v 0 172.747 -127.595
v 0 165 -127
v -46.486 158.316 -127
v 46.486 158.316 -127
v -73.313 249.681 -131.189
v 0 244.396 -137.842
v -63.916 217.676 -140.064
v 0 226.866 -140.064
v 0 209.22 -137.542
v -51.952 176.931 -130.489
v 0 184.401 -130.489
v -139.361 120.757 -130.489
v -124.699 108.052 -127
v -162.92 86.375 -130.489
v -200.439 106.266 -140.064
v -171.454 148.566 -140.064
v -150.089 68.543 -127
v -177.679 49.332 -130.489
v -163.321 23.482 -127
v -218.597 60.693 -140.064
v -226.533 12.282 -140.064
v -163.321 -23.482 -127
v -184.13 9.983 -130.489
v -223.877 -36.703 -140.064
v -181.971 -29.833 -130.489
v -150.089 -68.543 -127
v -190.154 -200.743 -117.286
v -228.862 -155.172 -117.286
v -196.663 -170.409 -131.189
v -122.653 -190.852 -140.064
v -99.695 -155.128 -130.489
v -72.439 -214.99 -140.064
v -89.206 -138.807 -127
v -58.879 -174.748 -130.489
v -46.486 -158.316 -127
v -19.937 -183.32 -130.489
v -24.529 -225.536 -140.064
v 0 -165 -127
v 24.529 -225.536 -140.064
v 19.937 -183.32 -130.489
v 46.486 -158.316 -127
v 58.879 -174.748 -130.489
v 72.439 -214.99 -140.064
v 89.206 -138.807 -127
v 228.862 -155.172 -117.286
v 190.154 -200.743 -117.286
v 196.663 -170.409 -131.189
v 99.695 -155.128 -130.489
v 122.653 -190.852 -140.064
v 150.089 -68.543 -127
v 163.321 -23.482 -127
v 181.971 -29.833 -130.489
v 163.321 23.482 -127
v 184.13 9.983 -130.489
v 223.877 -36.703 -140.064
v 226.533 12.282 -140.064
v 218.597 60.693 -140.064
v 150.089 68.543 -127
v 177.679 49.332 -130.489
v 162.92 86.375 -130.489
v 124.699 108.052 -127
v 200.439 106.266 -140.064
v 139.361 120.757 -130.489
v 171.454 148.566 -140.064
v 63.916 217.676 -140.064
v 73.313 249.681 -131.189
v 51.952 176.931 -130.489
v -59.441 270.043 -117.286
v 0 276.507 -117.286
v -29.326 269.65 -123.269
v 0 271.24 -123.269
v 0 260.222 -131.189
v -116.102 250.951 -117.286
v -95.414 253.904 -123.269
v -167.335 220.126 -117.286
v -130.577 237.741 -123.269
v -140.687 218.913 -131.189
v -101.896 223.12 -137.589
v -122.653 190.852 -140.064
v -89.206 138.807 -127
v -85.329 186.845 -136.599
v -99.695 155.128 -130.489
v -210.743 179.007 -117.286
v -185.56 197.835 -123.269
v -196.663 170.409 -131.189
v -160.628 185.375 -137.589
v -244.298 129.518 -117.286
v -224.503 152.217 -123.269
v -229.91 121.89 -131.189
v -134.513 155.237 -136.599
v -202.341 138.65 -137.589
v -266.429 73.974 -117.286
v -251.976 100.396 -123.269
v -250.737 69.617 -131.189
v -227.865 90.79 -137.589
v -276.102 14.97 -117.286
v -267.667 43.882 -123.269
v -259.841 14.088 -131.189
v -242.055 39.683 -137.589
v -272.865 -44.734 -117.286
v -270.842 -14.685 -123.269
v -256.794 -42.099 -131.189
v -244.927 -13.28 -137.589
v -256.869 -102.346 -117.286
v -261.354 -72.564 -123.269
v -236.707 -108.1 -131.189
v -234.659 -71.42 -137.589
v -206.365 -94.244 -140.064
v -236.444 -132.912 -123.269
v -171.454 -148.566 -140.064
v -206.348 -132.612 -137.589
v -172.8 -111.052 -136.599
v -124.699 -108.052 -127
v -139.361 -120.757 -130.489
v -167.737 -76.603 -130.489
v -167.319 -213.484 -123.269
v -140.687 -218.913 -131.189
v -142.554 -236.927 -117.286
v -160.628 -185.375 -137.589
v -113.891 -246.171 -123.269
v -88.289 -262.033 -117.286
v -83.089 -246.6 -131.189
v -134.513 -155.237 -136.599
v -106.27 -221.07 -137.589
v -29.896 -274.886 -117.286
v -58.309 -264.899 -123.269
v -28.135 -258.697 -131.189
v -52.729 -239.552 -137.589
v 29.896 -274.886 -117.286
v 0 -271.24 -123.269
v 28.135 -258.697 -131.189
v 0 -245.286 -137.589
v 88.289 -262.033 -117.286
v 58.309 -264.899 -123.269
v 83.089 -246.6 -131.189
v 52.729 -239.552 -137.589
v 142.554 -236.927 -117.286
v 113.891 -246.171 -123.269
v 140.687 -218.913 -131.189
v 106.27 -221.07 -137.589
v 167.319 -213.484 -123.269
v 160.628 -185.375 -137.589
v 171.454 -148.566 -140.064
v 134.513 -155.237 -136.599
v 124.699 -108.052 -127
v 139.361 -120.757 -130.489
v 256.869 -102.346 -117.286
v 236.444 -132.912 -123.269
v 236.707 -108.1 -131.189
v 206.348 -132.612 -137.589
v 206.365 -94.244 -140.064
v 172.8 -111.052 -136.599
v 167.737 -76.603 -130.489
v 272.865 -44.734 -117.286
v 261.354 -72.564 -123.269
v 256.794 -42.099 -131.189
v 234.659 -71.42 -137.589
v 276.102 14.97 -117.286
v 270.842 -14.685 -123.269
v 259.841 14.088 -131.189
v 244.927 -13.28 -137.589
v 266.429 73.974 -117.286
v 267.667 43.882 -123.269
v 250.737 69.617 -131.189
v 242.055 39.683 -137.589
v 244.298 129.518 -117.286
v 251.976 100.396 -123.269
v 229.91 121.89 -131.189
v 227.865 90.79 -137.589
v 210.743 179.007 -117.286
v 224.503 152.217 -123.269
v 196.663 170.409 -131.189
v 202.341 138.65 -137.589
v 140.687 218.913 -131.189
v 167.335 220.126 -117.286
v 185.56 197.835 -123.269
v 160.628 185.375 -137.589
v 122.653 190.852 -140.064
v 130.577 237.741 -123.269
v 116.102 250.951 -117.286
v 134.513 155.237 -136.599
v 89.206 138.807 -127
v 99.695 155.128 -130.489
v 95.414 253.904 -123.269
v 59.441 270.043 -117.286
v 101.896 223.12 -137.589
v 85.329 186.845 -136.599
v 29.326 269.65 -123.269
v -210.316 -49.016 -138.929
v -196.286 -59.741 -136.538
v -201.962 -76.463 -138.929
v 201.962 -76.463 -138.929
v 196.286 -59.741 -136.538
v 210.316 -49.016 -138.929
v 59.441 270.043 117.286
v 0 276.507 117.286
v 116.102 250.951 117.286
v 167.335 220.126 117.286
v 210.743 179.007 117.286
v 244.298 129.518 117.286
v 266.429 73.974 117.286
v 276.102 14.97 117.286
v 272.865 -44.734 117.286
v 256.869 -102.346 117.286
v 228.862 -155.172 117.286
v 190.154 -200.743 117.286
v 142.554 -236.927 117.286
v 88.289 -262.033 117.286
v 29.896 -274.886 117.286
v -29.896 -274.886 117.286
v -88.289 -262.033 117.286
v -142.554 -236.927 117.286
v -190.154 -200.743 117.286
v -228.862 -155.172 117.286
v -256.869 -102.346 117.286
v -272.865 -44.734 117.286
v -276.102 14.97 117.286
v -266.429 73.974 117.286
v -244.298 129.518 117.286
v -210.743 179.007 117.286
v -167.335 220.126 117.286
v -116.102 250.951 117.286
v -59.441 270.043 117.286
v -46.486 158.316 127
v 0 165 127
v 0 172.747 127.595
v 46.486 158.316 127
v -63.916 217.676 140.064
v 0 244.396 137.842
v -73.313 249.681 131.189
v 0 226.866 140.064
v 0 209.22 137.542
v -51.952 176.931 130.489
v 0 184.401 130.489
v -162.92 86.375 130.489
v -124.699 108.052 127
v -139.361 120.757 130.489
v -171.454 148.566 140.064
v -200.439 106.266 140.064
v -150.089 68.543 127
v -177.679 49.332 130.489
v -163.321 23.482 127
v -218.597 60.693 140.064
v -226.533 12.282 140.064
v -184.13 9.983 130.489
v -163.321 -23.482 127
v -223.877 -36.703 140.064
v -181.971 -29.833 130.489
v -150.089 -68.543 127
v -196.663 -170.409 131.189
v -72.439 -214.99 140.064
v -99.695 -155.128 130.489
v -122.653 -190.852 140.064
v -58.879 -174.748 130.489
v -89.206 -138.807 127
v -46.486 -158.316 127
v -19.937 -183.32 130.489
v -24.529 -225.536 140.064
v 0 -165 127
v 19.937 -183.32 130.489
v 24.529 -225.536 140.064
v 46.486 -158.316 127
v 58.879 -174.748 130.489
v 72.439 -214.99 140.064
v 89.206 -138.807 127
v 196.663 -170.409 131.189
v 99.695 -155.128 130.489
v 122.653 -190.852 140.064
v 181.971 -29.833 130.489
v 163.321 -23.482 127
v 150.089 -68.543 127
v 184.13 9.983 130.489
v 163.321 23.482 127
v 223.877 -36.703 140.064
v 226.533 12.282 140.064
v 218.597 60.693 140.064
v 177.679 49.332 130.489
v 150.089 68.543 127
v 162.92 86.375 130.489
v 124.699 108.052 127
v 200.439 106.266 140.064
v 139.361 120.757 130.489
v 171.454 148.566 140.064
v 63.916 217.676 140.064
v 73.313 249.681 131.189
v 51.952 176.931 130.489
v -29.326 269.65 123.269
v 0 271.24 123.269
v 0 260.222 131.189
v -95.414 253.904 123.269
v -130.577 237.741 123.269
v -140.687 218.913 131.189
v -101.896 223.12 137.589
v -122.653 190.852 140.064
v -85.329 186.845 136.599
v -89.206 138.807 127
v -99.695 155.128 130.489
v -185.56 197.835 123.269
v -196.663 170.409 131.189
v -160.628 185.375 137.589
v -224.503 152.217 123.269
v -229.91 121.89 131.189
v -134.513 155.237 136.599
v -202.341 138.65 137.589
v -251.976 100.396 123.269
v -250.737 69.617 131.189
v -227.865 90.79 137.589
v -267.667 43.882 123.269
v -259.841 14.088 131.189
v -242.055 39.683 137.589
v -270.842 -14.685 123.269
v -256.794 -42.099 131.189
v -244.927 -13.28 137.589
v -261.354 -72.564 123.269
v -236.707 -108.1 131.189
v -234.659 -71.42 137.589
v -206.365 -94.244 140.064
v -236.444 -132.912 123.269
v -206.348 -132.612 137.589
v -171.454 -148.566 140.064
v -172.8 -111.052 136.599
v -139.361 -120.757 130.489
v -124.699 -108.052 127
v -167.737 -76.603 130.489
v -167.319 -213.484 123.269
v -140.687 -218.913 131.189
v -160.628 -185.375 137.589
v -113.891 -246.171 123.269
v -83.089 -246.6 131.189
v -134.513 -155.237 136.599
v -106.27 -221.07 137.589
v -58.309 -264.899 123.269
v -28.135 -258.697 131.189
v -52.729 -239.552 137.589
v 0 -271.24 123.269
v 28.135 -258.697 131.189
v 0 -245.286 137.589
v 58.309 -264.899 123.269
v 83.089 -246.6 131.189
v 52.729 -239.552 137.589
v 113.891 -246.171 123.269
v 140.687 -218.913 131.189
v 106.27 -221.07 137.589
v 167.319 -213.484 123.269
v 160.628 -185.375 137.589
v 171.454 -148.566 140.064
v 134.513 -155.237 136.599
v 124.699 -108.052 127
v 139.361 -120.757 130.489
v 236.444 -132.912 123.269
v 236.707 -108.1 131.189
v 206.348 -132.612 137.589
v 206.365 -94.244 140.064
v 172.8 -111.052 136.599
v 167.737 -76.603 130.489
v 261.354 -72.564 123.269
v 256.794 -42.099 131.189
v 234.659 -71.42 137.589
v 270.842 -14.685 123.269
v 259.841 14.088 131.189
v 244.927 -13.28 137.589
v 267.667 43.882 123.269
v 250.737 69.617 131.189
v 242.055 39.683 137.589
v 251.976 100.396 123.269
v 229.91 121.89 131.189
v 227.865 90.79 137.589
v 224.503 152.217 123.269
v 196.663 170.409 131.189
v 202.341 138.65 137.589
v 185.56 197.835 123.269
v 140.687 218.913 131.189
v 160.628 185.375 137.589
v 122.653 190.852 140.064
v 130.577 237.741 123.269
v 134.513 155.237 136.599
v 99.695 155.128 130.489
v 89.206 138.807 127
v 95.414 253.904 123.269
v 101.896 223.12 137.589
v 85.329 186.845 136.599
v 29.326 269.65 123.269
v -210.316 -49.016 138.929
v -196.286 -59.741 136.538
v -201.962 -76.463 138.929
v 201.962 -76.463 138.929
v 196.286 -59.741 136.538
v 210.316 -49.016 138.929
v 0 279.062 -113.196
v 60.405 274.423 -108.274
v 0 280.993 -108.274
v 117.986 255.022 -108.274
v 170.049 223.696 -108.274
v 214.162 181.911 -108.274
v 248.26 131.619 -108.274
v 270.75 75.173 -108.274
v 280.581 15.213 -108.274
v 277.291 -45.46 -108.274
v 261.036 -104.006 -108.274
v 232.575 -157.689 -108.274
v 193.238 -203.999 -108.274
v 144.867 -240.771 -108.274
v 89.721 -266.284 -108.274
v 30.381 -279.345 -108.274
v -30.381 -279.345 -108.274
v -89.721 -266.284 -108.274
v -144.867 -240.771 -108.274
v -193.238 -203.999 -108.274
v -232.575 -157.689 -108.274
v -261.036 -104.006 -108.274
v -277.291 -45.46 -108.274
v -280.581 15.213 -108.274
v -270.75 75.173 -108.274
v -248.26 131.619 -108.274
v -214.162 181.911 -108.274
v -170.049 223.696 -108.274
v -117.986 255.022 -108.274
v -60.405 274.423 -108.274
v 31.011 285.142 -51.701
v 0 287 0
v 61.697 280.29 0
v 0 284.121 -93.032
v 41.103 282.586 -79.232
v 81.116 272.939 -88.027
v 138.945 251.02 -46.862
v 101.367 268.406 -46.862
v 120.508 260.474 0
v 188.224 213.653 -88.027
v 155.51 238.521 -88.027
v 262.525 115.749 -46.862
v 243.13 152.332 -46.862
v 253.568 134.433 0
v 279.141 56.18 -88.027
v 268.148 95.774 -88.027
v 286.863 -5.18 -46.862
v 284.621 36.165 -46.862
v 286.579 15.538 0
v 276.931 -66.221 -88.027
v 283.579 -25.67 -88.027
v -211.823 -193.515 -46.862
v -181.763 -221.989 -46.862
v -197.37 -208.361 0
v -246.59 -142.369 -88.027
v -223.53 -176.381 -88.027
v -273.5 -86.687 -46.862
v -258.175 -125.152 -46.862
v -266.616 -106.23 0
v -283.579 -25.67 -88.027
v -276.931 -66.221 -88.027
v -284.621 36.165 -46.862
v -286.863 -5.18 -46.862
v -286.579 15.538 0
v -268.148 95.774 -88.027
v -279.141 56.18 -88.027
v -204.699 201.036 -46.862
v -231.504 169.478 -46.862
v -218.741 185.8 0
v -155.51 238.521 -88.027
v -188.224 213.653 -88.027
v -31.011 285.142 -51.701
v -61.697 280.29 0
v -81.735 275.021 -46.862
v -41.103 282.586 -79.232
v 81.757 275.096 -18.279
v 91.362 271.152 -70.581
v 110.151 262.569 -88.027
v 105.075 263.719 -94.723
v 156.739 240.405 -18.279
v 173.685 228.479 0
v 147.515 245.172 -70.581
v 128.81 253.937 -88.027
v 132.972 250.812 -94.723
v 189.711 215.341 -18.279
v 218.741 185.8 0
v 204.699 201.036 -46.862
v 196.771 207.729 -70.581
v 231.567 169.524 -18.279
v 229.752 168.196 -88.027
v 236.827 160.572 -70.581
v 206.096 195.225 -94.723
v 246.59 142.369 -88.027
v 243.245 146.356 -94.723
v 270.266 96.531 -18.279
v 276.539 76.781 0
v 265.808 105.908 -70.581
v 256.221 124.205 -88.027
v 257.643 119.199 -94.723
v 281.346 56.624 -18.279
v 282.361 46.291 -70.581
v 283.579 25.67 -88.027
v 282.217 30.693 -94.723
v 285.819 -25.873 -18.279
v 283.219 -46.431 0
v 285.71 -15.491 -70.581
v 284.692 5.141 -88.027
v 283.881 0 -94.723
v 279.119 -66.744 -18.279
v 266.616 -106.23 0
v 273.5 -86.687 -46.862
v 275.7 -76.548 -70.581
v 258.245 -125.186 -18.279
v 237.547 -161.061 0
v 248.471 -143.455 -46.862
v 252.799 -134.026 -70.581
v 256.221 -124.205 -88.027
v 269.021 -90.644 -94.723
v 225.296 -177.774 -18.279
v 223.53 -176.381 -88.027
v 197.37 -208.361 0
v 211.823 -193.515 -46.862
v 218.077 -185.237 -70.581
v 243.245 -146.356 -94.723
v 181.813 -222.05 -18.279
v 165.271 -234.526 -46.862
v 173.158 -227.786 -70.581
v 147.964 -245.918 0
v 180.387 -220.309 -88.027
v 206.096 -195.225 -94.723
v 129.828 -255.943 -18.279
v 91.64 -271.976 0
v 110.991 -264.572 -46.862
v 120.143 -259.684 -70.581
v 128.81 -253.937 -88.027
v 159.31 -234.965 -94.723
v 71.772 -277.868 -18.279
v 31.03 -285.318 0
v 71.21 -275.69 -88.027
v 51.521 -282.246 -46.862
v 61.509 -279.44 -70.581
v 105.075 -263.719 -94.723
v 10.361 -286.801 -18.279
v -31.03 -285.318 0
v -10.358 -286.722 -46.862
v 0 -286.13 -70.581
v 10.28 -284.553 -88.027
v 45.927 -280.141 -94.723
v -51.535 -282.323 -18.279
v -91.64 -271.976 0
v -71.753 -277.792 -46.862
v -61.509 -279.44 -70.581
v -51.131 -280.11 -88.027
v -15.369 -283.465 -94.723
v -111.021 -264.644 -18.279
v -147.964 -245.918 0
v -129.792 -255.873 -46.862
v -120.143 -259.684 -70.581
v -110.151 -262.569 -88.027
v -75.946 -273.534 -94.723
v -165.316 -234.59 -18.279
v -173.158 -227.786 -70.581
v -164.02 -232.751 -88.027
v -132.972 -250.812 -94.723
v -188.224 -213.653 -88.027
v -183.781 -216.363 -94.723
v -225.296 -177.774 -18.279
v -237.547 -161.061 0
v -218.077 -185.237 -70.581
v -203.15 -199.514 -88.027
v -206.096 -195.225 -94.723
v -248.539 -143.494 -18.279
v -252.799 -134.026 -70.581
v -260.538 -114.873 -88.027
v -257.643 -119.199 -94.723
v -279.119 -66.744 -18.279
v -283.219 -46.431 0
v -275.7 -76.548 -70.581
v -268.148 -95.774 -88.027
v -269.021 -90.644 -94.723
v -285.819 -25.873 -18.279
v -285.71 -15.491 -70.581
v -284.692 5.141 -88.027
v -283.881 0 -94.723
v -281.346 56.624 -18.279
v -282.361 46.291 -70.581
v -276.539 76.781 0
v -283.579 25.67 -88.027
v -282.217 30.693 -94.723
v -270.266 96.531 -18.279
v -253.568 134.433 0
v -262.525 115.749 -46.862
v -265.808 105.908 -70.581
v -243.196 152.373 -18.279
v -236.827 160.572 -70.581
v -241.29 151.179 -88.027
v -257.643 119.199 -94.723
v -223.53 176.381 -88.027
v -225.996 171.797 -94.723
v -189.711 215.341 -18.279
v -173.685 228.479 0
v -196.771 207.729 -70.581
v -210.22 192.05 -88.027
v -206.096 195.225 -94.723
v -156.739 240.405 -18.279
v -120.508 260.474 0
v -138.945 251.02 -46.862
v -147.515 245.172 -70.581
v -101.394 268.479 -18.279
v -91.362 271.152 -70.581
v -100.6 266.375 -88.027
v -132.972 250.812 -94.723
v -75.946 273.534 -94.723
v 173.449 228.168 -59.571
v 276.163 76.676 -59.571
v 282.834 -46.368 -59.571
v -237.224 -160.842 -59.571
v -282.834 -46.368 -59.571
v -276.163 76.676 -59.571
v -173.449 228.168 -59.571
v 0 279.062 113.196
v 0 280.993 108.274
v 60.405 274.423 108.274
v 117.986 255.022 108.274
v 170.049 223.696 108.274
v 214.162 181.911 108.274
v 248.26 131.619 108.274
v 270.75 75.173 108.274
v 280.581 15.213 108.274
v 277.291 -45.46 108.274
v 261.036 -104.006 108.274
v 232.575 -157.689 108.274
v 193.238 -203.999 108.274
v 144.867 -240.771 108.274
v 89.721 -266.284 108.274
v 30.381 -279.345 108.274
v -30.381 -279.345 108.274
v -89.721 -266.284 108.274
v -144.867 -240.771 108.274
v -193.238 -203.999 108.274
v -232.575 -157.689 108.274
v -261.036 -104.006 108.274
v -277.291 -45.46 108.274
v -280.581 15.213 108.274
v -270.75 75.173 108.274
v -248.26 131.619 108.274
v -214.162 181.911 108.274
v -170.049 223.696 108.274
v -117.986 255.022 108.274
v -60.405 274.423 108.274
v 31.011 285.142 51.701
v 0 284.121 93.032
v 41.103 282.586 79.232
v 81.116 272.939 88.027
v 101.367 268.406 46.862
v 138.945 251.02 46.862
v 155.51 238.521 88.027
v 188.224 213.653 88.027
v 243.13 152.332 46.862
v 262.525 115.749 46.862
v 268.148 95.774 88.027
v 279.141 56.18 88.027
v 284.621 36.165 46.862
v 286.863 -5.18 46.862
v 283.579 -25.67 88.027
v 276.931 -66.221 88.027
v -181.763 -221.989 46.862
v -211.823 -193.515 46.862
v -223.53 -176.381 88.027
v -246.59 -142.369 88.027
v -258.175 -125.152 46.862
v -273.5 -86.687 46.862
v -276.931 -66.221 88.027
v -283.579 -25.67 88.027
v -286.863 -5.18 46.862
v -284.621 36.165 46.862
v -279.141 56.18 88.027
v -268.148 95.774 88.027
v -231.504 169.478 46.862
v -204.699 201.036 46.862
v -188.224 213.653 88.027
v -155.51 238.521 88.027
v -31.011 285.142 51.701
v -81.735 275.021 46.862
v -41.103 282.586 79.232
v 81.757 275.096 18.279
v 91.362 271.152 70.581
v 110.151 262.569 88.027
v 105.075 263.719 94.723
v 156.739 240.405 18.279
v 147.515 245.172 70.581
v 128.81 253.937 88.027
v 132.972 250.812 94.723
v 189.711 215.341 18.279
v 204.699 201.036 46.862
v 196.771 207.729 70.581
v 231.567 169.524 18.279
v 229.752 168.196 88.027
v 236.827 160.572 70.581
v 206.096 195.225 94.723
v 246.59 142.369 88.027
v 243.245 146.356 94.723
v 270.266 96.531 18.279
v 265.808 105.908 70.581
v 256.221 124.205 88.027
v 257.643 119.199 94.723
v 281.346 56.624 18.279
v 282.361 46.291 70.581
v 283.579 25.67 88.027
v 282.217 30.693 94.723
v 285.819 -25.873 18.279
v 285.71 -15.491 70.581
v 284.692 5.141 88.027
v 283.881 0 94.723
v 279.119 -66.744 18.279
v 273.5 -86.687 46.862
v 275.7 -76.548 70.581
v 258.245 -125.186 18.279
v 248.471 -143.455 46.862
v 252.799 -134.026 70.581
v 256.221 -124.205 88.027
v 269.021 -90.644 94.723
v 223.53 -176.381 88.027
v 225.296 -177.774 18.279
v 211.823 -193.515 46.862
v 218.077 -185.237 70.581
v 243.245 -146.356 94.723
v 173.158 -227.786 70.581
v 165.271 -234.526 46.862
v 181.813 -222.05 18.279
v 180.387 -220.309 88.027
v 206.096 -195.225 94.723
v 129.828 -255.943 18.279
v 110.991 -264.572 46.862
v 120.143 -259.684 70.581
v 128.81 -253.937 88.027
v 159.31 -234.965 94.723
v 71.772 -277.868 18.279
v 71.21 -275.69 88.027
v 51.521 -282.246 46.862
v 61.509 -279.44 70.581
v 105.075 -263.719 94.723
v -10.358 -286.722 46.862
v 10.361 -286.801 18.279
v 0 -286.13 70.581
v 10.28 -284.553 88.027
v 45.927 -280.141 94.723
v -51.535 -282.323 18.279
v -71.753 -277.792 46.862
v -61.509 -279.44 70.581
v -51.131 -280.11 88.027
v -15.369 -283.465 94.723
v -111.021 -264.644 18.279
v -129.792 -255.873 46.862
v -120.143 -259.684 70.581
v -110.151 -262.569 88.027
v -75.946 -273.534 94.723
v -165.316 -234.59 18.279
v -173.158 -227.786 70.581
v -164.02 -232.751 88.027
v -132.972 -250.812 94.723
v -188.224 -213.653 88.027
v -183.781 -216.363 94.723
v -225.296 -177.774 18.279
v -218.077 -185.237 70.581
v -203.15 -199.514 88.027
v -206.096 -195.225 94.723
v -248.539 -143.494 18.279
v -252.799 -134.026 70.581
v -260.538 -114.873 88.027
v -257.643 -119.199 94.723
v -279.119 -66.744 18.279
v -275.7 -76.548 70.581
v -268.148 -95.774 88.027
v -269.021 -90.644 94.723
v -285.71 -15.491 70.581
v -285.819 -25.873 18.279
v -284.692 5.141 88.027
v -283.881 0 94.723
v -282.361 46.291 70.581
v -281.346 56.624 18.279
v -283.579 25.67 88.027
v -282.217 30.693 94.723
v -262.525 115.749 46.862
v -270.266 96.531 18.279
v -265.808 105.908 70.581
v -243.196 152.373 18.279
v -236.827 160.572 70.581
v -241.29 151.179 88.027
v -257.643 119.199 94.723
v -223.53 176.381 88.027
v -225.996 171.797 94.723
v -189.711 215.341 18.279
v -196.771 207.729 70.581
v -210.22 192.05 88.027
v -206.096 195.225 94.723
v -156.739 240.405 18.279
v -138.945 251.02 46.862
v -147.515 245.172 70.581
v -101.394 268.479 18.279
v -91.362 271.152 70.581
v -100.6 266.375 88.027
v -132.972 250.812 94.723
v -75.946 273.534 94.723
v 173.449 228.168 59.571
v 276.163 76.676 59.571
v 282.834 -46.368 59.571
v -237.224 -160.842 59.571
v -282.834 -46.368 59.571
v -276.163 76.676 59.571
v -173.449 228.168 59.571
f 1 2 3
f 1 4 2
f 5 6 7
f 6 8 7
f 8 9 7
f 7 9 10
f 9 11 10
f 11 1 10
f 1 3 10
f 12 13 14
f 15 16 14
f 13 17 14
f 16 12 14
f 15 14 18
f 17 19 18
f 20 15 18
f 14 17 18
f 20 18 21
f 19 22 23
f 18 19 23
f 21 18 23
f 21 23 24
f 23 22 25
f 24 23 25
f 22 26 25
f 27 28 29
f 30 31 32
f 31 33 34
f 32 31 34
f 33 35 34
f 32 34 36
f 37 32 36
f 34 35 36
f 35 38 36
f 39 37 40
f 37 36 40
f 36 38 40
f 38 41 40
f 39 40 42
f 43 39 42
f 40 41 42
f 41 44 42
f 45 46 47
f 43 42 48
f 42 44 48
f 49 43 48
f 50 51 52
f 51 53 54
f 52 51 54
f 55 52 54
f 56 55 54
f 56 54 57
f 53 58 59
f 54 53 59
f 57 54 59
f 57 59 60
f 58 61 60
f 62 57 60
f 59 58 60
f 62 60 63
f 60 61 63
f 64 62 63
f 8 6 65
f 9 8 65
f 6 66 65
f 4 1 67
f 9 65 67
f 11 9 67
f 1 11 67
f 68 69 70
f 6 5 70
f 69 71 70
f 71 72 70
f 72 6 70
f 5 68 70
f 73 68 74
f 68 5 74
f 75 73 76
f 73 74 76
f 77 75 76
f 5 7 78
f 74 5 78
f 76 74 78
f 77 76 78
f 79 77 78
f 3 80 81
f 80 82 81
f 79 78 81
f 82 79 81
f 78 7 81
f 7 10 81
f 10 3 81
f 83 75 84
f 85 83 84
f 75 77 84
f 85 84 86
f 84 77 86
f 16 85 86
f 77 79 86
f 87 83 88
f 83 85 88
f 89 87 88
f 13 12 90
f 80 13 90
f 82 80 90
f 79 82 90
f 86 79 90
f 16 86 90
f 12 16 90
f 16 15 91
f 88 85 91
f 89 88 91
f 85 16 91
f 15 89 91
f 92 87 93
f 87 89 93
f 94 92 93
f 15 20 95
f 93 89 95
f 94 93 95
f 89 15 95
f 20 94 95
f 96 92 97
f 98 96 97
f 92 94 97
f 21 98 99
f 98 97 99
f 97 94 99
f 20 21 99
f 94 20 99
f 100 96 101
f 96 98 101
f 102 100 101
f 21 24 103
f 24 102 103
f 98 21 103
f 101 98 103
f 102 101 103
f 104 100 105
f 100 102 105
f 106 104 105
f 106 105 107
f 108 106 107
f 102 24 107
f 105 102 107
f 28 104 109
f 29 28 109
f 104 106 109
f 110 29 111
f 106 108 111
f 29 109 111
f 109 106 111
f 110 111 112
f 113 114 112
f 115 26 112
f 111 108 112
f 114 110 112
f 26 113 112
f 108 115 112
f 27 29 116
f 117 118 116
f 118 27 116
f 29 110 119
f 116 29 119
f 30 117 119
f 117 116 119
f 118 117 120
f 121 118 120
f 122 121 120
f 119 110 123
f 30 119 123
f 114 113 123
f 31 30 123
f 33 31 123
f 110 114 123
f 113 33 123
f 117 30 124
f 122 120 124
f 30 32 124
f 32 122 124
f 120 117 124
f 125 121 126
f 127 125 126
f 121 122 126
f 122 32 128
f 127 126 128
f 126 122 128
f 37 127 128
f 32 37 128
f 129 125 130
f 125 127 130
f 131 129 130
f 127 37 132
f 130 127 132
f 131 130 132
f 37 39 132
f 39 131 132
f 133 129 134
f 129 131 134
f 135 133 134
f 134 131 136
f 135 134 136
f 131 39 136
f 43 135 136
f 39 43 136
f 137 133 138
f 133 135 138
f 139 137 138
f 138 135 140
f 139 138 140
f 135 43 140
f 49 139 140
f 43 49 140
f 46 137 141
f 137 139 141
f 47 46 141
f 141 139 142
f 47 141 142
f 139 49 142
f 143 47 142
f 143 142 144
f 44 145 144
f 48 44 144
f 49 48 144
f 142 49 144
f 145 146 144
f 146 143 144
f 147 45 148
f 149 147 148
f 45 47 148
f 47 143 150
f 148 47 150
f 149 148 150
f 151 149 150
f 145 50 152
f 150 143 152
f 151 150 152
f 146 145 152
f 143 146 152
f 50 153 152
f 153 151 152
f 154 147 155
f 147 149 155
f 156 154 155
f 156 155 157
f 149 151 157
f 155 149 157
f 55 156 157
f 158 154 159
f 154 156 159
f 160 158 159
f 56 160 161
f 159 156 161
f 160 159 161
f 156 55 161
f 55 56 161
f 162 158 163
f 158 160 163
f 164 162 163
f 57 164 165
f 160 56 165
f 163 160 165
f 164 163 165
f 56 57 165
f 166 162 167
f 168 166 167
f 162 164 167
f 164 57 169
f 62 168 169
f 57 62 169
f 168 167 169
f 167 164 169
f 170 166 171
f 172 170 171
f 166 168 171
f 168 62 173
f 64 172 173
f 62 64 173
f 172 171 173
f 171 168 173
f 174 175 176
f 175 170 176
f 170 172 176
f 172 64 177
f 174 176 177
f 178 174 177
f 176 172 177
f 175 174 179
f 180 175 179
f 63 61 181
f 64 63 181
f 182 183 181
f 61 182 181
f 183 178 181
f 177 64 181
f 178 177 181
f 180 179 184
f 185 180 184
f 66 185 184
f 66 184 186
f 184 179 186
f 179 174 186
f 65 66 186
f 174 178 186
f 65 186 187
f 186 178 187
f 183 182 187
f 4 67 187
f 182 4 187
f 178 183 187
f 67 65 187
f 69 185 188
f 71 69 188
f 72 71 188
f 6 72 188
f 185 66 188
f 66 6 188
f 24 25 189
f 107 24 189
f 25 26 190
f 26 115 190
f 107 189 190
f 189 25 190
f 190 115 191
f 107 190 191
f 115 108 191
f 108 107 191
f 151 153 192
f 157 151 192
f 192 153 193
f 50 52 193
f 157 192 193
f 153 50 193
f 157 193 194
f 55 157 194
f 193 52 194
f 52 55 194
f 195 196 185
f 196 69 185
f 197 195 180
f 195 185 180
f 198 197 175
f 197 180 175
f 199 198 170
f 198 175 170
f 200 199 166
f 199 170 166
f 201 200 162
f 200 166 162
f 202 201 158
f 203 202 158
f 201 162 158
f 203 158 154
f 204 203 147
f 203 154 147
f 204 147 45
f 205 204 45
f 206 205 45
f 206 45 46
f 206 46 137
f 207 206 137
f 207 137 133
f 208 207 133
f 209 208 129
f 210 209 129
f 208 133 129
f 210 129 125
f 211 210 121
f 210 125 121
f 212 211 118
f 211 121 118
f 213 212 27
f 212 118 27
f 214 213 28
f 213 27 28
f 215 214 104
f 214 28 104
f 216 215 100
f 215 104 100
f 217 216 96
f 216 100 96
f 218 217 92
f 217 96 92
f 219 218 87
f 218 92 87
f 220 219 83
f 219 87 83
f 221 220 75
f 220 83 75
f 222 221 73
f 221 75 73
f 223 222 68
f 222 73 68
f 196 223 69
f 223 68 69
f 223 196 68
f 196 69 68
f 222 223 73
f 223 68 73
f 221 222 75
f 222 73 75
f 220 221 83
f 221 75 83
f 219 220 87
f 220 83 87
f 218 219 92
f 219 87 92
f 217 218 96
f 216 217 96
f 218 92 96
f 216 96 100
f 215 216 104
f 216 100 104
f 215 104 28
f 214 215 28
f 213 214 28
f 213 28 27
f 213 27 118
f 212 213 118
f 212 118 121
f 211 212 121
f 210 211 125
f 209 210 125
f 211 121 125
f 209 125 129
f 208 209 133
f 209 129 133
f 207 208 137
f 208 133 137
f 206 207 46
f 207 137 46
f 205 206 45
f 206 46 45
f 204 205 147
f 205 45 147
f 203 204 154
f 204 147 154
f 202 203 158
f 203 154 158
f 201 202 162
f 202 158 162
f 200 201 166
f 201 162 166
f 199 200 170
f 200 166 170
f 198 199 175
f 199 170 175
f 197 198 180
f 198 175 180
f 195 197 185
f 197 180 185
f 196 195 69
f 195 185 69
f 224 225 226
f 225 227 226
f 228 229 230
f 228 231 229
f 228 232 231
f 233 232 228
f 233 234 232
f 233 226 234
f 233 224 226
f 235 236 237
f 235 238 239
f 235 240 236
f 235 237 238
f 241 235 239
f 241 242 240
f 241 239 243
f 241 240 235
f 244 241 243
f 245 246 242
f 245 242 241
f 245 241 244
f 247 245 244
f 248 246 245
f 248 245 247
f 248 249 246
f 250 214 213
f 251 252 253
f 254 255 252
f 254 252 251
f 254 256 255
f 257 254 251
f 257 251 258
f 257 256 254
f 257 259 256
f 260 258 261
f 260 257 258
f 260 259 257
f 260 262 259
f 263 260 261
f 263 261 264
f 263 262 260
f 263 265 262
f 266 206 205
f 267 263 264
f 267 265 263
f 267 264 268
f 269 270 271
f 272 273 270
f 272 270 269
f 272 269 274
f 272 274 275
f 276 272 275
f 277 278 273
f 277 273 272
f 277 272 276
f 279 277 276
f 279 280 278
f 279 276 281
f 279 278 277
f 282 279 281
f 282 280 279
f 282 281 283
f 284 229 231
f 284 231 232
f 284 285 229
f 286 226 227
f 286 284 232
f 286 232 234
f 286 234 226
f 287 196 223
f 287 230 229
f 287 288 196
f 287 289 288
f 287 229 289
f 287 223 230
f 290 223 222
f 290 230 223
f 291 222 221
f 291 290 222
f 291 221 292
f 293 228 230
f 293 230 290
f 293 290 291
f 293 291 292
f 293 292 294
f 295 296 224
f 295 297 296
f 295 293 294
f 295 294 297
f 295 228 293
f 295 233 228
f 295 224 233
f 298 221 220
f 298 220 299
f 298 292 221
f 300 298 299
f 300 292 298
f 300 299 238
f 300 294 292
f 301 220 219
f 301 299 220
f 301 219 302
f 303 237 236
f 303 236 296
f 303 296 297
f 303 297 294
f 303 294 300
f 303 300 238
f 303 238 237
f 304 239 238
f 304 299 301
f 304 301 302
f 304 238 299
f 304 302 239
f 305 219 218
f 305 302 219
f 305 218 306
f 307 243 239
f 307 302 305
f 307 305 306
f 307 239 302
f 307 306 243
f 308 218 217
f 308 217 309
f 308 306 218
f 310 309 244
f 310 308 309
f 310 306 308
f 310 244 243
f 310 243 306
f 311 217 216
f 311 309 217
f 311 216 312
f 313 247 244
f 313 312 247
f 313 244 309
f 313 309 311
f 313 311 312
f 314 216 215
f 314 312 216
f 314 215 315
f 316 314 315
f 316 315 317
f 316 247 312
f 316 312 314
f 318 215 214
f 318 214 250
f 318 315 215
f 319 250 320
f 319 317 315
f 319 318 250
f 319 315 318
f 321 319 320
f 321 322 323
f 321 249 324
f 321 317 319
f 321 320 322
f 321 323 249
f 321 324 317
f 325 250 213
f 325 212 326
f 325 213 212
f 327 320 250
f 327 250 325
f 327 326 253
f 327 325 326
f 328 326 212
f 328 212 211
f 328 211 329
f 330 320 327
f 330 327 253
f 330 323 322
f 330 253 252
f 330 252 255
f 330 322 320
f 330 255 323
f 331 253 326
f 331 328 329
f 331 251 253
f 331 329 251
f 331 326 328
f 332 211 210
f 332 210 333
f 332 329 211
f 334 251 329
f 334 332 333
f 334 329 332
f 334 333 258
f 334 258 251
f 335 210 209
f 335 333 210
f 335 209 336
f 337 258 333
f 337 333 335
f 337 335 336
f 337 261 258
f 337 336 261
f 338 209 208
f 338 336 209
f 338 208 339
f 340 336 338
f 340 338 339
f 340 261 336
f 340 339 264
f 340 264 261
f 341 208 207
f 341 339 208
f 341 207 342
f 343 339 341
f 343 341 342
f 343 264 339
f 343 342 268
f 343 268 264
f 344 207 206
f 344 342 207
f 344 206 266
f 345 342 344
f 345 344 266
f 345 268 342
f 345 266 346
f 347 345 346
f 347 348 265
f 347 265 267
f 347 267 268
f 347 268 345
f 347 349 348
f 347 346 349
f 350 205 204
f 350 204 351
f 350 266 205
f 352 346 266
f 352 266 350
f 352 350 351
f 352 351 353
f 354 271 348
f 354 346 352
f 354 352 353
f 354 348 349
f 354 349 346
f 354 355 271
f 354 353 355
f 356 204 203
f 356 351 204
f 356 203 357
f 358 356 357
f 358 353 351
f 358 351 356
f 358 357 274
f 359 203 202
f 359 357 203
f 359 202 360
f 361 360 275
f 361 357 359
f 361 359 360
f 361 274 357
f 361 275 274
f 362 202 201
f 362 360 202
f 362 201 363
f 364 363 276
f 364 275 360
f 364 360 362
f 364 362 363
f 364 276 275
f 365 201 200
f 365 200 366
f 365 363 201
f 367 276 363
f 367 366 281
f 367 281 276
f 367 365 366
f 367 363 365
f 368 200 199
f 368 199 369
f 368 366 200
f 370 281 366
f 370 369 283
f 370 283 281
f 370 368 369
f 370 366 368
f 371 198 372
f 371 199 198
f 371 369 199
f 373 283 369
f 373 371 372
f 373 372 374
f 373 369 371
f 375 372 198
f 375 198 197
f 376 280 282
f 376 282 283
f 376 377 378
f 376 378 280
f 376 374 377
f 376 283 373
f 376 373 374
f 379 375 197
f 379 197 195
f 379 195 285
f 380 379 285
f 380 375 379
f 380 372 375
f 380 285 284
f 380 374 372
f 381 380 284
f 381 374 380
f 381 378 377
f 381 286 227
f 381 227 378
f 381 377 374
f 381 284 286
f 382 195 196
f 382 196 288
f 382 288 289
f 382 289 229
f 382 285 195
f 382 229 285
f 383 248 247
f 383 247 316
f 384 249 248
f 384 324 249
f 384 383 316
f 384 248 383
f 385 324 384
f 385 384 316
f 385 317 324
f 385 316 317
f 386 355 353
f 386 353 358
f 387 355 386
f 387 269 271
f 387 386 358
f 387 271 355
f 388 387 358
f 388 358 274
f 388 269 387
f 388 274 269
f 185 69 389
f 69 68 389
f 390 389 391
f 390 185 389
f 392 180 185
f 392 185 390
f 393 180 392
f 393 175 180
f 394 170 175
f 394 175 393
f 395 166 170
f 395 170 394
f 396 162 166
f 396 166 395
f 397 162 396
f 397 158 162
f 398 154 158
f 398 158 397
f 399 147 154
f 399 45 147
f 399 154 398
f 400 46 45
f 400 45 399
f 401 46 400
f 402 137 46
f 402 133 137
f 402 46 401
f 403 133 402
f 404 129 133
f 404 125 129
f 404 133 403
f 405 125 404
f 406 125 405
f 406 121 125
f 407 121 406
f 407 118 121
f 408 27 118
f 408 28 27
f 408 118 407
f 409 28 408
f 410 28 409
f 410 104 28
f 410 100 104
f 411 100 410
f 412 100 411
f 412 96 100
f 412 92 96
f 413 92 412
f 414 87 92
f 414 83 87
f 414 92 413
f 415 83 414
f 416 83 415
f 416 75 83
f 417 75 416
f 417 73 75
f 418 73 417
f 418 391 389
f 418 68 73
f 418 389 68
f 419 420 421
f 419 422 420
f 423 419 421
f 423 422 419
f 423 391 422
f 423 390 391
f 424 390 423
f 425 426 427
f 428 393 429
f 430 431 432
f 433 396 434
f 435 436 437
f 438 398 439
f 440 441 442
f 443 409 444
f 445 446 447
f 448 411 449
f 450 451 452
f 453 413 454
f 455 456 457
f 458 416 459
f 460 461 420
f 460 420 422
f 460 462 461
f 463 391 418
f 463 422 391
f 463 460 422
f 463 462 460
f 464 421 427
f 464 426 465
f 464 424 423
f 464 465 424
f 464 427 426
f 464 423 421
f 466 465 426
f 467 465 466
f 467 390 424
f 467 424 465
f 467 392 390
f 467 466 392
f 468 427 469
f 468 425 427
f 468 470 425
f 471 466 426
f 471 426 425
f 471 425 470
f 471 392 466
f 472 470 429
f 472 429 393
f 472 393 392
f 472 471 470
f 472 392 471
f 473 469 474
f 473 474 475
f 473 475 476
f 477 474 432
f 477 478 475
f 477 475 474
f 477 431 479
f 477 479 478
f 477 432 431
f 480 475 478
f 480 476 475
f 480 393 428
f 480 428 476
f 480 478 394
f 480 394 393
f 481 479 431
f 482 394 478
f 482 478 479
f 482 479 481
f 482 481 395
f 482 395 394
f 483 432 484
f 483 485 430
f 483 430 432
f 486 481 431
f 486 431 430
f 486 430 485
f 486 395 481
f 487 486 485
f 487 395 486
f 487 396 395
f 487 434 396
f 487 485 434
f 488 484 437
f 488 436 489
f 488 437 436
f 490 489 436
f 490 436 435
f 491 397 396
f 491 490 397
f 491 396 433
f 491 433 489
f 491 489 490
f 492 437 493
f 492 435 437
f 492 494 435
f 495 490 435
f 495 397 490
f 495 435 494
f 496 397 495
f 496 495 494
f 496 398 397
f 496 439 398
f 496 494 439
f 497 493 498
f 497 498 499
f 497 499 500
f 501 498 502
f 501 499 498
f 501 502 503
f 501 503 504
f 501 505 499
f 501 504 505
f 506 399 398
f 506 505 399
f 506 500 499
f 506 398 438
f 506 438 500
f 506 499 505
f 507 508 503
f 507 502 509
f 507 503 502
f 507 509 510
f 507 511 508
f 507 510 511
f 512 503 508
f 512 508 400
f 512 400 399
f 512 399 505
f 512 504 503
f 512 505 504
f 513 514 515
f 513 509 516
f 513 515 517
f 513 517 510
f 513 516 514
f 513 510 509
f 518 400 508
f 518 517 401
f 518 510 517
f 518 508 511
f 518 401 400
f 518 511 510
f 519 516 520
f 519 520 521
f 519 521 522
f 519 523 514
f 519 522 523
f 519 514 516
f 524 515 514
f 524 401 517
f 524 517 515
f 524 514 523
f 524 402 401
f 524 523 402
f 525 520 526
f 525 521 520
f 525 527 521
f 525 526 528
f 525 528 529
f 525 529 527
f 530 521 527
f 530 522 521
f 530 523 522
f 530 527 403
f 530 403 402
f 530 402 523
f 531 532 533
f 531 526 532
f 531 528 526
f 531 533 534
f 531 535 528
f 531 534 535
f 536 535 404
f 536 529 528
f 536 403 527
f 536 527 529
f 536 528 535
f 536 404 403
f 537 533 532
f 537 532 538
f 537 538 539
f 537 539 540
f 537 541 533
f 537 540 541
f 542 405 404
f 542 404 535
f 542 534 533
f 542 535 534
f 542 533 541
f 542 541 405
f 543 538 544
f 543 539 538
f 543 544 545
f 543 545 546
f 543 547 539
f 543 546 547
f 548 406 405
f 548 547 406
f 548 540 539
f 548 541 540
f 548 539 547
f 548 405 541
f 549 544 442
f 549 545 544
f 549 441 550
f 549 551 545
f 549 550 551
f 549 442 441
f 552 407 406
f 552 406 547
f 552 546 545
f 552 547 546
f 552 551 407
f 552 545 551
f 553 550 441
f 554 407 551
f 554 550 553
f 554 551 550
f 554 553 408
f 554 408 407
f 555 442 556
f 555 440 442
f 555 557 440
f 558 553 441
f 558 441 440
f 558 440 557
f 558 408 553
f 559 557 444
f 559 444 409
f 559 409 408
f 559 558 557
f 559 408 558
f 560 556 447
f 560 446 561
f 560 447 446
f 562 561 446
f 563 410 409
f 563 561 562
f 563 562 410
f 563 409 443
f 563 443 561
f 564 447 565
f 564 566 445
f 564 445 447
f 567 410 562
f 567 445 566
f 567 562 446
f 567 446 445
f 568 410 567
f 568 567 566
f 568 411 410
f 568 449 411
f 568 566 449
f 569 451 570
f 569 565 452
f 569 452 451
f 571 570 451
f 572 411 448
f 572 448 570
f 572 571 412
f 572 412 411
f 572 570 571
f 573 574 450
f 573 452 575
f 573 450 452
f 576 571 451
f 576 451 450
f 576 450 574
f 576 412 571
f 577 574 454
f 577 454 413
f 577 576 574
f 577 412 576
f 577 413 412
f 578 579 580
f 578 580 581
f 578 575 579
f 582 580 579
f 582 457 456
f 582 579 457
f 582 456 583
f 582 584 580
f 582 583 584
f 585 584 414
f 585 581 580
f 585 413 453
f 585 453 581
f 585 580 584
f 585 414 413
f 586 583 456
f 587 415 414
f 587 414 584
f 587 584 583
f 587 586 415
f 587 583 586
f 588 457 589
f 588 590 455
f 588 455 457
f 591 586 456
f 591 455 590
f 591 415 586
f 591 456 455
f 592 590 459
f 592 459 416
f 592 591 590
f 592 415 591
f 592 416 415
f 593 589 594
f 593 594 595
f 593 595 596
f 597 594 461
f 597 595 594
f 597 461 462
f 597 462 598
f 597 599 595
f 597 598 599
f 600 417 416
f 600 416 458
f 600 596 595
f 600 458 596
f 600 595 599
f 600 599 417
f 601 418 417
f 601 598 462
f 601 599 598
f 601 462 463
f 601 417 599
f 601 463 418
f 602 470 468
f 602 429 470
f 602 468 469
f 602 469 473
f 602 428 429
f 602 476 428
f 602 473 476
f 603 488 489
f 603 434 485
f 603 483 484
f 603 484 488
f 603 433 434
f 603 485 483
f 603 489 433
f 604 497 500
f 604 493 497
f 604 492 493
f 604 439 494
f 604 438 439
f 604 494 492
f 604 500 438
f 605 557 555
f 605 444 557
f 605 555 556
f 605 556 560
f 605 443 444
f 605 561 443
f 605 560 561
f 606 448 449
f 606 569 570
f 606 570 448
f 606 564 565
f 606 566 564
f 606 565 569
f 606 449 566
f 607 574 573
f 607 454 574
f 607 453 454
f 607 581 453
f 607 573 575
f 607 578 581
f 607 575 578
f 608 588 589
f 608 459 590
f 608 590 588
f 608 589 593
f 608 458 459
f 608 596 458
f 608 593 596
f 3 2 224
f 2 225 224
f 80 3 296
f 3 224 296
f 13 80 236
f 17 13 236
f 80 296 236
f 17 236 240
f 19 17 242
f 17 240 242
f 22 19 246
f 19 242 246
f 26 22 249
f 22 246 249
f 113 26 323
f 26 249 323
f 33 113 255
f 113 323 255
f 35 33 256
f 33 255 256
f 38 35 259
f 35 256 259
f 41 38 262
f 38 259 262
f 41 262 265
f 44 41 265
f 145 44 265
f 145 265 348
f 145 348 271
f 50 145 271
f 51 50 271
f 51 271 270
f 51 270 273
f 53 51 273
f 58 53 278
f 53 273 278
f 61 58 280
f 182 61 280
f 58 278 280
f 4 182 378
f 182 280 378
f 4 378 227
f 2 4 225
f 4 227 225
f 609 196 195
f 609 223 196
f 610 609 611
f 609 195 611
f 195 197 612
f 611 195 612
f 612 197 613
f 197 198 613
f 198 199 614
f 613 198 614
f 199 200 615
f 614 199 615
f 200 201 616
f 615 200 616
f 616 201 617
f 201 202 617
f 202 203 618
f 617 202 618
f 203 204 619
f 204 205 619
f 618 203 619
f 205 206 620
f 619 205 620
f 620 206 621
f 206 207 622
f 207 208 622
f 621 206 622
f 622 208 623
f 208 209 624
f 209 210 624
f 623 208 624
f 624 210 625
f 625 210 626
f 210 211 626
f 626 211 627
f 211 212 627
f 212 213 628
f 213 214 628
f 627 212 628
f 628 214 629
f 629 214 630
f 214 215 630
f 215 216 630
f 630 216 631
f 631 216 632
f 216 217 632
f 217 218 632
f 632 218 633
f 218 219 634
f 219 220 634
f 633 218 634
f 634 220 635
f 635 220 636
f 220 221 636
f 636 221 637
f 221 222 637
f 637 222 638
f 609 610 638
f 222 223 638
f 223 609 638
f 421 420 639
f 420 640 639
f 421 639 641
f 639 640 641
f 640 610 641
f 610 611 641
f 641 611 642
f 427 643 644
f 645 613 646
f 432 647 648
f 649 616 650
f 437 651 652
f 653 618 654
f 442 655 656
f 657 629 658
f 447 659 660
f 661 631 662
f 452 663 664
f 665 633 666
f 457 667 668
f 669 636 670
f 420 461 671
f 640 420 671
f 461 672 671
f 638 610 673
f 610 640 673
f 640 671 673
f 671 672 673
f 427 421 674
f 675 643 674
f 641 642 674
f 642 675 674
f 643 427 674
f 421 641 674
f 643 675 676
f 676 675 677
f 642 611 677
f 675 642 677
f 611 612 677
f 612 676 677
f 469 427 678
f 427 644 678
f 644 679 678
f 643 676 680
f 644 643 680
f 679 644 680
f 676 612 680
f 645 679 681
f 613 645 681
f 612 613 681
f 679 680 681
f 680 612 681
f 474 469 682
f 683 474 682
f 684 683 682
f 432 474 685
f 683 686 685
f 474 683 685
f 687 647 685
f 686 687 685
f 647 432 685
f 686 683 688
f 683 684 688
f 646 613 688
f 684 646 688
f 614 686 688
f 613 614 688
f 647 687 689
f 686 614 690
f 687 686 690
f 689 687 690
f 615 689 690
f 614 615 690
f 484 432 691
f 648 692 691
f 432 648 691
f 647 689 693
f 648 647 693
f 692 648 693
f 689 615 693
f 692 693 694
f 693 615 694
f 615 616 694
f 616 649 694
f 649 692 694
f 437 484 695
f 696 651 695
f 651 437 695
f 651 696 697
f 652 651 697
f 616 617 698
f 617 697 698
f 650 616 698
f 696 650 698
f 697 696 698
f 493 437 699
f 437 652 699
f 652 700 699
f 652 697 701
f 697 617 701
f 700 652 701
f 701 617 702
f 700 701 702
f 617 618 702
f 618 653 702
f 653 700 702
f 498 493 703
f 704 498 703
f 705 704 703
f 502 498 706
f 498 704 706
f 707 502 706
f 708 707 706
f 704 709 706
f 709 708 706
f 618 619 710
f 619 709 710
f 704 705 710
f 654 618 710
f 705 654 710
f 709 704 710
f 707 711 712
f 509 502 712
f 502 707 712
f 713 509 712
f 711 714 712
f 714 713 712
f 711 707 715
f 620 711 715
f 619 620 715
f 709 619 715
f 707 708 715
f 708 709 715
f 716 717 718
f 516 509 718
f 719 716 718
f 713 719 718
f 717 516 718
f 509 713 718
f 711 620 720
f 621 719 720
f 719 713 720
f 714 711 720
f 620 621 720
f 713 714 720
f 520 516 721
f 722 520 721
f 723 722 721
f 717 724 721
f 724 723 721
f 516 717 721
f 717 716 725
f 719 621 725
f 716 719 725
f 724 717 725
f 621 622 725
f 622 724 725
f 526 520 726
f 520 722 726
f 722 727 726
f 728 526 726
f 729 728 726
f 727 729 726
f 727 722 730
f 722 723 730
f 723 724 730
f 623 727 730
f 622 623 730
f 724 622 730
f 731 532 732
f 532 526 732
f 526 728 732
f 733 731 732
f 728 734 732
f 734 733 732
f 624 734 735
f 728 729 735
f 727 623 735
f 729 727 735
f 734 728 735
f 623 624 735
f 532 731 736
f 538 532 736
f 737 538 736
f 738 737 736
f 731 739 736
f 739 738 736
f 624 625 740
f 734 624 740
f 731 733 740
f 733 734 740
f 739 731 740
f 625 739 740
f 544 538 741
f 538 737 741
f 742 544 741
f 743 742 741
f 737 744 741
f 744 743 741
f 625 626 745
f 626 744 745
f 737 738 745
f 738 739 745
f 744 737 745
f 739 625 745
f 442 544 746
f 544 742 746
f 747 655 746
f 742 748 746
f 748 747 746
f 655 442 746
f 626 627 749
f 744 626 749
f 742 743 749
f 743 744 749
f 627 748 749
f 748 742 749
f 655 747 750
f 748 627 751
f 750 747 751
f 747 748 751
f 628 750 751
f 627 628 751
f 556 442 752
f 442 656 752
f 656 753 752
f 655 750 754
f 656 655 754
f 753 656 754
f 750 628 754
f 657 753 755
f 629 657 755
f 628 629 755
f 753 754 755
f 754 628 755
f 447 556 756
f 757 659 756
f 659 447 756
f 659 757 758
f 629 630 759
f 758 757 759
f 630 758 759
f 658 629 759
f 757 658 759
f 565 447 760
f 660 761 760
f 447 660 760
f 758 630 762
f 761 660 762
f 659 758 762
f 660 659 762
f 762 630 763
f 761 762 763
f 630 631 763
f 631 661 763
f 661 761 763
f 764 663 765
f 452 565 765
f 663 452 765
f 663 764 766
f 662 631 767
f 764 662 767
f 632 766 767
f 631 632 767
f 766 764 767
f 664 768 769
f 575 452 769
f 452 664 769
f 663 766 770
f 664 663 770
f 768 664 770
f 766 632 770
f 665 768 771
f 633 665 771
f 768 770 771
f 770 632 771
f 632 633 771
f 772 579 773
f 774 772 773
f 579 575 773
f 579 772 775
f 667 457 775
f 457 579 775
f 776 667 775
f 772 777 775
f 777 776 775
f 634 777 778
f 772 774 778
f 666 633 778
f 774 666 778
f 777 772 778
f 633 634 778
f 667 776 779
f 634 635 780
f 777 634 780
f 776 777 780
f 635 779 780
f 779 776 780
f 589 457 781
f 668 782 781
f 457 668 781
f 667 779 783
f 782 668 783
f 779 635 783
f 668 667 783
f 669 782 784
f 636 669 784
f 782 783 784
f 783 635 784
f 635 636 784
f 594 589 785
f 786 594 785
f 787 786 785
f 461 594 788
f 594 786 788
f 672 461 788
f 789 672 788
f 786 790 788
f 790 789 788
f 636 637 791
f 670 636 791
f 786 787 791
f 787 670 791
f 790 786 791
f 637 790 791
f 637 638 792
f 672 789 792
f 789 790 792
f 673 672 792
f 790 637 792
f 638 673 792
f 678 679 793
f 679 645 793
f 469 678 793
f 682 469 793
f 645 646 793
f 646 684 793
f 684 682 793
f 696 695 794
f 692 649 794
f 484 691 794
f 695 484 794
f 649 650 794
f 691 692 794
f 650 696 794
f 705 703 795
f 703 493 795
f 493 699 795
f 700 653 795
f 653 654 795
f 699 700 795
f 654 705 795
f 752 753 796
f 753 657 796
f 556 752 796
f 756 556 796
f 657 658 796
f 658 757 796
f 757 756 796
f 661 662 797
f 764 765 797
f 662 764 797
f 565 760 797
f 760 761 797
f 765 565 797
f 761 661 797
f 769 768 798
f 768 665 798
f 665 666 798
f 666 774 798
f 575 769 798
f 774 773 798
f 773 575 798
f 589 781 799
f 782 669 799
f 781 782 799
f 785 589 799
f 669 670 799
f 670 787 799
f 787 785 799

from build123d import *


with BuildPart() as part:
    # Sketch1 → Revolve1 (revolve)
    with BuildSketch(Plane(origin=(0, 0, 0), x_dir=(0, 0, -1), z_dir=(1, 0, 0))):
        with BuildLine():
            Line((-117.286167083, 276.507310694), (117.286167083, 276.507310694))
            add(Edge.make_bspline(
                [(0, 287), (4.079279904, 286.826687196), (106.061876701, 288.284046759), (113.606283575, 278.880093182), (117.286167083, 276.507310694)],
                knots=[0, 0, 0, 0, 0.064751478, 0.299257628, 0.299257628, 0.299257628, 0.299257628], degree=3))
            add(Edge.make_bspline(
                [(0, 287), (-4.079279904, 286.826687196), (-106.061876701, 288.284046759), (-113.606283575, 278.880093182), (-117.286167083, 276.507310694)],
                knots=[0, 0, 0, 0, 0.064751478, 0.299257628, 0.299257628, 0.299257628, 0.299257628], degree=3))
        make_face()
    revolve(axis=Axis((0, 0, 146.251356054), (0, 0, -1)))


with BuildPart() as body_2:
    # Sketch7 → Revolve2 (revolve)
    with BuildSketch(Plane(origin=(0, 0, 0), x_dir=(0, 0, -1), z_dir=(1, 0, 0))):
        with BuildLine():
            Line((-117.286167083, 276.507310694), (117.286167083, 276.507310694))
            add(Edge.make_bspline(
                [(117.286167083, 276.507310694), (117.526059044, 276.352628775), (123.196173432, 273.03306649), (155.207133321, 236.210615055), (126.01944742, 177.98197113), (127, 165)],
                knots=[0.299257628, 0.299257628, 0.299257628, 0.299257628, 0.314545107, 0.697277584, 1, 1, 1, 1], degree=3))
            Line((127, 165), (-127, 165))
            add(Edge.make_bspline(
                [(-117.286167083, 276.507310694), (-117.526059044, 276.352628775), (-123.196173432, 273.03306649), (-155.207133321, 236.210615055), (-126.01944742, 177.98197113), (-127, 165)],
                knots=[0.299257628, 0.299257628, 0.299257628, 0.299257628, 0.314545107, 0.697277584, 1, 1, 1, 1], degree=3))
        make_face()
    revolve(axis=Axis((0, 0, -194.897474353), (0, 0, 1)))


solid = Compound([part.part, body_2.part])
